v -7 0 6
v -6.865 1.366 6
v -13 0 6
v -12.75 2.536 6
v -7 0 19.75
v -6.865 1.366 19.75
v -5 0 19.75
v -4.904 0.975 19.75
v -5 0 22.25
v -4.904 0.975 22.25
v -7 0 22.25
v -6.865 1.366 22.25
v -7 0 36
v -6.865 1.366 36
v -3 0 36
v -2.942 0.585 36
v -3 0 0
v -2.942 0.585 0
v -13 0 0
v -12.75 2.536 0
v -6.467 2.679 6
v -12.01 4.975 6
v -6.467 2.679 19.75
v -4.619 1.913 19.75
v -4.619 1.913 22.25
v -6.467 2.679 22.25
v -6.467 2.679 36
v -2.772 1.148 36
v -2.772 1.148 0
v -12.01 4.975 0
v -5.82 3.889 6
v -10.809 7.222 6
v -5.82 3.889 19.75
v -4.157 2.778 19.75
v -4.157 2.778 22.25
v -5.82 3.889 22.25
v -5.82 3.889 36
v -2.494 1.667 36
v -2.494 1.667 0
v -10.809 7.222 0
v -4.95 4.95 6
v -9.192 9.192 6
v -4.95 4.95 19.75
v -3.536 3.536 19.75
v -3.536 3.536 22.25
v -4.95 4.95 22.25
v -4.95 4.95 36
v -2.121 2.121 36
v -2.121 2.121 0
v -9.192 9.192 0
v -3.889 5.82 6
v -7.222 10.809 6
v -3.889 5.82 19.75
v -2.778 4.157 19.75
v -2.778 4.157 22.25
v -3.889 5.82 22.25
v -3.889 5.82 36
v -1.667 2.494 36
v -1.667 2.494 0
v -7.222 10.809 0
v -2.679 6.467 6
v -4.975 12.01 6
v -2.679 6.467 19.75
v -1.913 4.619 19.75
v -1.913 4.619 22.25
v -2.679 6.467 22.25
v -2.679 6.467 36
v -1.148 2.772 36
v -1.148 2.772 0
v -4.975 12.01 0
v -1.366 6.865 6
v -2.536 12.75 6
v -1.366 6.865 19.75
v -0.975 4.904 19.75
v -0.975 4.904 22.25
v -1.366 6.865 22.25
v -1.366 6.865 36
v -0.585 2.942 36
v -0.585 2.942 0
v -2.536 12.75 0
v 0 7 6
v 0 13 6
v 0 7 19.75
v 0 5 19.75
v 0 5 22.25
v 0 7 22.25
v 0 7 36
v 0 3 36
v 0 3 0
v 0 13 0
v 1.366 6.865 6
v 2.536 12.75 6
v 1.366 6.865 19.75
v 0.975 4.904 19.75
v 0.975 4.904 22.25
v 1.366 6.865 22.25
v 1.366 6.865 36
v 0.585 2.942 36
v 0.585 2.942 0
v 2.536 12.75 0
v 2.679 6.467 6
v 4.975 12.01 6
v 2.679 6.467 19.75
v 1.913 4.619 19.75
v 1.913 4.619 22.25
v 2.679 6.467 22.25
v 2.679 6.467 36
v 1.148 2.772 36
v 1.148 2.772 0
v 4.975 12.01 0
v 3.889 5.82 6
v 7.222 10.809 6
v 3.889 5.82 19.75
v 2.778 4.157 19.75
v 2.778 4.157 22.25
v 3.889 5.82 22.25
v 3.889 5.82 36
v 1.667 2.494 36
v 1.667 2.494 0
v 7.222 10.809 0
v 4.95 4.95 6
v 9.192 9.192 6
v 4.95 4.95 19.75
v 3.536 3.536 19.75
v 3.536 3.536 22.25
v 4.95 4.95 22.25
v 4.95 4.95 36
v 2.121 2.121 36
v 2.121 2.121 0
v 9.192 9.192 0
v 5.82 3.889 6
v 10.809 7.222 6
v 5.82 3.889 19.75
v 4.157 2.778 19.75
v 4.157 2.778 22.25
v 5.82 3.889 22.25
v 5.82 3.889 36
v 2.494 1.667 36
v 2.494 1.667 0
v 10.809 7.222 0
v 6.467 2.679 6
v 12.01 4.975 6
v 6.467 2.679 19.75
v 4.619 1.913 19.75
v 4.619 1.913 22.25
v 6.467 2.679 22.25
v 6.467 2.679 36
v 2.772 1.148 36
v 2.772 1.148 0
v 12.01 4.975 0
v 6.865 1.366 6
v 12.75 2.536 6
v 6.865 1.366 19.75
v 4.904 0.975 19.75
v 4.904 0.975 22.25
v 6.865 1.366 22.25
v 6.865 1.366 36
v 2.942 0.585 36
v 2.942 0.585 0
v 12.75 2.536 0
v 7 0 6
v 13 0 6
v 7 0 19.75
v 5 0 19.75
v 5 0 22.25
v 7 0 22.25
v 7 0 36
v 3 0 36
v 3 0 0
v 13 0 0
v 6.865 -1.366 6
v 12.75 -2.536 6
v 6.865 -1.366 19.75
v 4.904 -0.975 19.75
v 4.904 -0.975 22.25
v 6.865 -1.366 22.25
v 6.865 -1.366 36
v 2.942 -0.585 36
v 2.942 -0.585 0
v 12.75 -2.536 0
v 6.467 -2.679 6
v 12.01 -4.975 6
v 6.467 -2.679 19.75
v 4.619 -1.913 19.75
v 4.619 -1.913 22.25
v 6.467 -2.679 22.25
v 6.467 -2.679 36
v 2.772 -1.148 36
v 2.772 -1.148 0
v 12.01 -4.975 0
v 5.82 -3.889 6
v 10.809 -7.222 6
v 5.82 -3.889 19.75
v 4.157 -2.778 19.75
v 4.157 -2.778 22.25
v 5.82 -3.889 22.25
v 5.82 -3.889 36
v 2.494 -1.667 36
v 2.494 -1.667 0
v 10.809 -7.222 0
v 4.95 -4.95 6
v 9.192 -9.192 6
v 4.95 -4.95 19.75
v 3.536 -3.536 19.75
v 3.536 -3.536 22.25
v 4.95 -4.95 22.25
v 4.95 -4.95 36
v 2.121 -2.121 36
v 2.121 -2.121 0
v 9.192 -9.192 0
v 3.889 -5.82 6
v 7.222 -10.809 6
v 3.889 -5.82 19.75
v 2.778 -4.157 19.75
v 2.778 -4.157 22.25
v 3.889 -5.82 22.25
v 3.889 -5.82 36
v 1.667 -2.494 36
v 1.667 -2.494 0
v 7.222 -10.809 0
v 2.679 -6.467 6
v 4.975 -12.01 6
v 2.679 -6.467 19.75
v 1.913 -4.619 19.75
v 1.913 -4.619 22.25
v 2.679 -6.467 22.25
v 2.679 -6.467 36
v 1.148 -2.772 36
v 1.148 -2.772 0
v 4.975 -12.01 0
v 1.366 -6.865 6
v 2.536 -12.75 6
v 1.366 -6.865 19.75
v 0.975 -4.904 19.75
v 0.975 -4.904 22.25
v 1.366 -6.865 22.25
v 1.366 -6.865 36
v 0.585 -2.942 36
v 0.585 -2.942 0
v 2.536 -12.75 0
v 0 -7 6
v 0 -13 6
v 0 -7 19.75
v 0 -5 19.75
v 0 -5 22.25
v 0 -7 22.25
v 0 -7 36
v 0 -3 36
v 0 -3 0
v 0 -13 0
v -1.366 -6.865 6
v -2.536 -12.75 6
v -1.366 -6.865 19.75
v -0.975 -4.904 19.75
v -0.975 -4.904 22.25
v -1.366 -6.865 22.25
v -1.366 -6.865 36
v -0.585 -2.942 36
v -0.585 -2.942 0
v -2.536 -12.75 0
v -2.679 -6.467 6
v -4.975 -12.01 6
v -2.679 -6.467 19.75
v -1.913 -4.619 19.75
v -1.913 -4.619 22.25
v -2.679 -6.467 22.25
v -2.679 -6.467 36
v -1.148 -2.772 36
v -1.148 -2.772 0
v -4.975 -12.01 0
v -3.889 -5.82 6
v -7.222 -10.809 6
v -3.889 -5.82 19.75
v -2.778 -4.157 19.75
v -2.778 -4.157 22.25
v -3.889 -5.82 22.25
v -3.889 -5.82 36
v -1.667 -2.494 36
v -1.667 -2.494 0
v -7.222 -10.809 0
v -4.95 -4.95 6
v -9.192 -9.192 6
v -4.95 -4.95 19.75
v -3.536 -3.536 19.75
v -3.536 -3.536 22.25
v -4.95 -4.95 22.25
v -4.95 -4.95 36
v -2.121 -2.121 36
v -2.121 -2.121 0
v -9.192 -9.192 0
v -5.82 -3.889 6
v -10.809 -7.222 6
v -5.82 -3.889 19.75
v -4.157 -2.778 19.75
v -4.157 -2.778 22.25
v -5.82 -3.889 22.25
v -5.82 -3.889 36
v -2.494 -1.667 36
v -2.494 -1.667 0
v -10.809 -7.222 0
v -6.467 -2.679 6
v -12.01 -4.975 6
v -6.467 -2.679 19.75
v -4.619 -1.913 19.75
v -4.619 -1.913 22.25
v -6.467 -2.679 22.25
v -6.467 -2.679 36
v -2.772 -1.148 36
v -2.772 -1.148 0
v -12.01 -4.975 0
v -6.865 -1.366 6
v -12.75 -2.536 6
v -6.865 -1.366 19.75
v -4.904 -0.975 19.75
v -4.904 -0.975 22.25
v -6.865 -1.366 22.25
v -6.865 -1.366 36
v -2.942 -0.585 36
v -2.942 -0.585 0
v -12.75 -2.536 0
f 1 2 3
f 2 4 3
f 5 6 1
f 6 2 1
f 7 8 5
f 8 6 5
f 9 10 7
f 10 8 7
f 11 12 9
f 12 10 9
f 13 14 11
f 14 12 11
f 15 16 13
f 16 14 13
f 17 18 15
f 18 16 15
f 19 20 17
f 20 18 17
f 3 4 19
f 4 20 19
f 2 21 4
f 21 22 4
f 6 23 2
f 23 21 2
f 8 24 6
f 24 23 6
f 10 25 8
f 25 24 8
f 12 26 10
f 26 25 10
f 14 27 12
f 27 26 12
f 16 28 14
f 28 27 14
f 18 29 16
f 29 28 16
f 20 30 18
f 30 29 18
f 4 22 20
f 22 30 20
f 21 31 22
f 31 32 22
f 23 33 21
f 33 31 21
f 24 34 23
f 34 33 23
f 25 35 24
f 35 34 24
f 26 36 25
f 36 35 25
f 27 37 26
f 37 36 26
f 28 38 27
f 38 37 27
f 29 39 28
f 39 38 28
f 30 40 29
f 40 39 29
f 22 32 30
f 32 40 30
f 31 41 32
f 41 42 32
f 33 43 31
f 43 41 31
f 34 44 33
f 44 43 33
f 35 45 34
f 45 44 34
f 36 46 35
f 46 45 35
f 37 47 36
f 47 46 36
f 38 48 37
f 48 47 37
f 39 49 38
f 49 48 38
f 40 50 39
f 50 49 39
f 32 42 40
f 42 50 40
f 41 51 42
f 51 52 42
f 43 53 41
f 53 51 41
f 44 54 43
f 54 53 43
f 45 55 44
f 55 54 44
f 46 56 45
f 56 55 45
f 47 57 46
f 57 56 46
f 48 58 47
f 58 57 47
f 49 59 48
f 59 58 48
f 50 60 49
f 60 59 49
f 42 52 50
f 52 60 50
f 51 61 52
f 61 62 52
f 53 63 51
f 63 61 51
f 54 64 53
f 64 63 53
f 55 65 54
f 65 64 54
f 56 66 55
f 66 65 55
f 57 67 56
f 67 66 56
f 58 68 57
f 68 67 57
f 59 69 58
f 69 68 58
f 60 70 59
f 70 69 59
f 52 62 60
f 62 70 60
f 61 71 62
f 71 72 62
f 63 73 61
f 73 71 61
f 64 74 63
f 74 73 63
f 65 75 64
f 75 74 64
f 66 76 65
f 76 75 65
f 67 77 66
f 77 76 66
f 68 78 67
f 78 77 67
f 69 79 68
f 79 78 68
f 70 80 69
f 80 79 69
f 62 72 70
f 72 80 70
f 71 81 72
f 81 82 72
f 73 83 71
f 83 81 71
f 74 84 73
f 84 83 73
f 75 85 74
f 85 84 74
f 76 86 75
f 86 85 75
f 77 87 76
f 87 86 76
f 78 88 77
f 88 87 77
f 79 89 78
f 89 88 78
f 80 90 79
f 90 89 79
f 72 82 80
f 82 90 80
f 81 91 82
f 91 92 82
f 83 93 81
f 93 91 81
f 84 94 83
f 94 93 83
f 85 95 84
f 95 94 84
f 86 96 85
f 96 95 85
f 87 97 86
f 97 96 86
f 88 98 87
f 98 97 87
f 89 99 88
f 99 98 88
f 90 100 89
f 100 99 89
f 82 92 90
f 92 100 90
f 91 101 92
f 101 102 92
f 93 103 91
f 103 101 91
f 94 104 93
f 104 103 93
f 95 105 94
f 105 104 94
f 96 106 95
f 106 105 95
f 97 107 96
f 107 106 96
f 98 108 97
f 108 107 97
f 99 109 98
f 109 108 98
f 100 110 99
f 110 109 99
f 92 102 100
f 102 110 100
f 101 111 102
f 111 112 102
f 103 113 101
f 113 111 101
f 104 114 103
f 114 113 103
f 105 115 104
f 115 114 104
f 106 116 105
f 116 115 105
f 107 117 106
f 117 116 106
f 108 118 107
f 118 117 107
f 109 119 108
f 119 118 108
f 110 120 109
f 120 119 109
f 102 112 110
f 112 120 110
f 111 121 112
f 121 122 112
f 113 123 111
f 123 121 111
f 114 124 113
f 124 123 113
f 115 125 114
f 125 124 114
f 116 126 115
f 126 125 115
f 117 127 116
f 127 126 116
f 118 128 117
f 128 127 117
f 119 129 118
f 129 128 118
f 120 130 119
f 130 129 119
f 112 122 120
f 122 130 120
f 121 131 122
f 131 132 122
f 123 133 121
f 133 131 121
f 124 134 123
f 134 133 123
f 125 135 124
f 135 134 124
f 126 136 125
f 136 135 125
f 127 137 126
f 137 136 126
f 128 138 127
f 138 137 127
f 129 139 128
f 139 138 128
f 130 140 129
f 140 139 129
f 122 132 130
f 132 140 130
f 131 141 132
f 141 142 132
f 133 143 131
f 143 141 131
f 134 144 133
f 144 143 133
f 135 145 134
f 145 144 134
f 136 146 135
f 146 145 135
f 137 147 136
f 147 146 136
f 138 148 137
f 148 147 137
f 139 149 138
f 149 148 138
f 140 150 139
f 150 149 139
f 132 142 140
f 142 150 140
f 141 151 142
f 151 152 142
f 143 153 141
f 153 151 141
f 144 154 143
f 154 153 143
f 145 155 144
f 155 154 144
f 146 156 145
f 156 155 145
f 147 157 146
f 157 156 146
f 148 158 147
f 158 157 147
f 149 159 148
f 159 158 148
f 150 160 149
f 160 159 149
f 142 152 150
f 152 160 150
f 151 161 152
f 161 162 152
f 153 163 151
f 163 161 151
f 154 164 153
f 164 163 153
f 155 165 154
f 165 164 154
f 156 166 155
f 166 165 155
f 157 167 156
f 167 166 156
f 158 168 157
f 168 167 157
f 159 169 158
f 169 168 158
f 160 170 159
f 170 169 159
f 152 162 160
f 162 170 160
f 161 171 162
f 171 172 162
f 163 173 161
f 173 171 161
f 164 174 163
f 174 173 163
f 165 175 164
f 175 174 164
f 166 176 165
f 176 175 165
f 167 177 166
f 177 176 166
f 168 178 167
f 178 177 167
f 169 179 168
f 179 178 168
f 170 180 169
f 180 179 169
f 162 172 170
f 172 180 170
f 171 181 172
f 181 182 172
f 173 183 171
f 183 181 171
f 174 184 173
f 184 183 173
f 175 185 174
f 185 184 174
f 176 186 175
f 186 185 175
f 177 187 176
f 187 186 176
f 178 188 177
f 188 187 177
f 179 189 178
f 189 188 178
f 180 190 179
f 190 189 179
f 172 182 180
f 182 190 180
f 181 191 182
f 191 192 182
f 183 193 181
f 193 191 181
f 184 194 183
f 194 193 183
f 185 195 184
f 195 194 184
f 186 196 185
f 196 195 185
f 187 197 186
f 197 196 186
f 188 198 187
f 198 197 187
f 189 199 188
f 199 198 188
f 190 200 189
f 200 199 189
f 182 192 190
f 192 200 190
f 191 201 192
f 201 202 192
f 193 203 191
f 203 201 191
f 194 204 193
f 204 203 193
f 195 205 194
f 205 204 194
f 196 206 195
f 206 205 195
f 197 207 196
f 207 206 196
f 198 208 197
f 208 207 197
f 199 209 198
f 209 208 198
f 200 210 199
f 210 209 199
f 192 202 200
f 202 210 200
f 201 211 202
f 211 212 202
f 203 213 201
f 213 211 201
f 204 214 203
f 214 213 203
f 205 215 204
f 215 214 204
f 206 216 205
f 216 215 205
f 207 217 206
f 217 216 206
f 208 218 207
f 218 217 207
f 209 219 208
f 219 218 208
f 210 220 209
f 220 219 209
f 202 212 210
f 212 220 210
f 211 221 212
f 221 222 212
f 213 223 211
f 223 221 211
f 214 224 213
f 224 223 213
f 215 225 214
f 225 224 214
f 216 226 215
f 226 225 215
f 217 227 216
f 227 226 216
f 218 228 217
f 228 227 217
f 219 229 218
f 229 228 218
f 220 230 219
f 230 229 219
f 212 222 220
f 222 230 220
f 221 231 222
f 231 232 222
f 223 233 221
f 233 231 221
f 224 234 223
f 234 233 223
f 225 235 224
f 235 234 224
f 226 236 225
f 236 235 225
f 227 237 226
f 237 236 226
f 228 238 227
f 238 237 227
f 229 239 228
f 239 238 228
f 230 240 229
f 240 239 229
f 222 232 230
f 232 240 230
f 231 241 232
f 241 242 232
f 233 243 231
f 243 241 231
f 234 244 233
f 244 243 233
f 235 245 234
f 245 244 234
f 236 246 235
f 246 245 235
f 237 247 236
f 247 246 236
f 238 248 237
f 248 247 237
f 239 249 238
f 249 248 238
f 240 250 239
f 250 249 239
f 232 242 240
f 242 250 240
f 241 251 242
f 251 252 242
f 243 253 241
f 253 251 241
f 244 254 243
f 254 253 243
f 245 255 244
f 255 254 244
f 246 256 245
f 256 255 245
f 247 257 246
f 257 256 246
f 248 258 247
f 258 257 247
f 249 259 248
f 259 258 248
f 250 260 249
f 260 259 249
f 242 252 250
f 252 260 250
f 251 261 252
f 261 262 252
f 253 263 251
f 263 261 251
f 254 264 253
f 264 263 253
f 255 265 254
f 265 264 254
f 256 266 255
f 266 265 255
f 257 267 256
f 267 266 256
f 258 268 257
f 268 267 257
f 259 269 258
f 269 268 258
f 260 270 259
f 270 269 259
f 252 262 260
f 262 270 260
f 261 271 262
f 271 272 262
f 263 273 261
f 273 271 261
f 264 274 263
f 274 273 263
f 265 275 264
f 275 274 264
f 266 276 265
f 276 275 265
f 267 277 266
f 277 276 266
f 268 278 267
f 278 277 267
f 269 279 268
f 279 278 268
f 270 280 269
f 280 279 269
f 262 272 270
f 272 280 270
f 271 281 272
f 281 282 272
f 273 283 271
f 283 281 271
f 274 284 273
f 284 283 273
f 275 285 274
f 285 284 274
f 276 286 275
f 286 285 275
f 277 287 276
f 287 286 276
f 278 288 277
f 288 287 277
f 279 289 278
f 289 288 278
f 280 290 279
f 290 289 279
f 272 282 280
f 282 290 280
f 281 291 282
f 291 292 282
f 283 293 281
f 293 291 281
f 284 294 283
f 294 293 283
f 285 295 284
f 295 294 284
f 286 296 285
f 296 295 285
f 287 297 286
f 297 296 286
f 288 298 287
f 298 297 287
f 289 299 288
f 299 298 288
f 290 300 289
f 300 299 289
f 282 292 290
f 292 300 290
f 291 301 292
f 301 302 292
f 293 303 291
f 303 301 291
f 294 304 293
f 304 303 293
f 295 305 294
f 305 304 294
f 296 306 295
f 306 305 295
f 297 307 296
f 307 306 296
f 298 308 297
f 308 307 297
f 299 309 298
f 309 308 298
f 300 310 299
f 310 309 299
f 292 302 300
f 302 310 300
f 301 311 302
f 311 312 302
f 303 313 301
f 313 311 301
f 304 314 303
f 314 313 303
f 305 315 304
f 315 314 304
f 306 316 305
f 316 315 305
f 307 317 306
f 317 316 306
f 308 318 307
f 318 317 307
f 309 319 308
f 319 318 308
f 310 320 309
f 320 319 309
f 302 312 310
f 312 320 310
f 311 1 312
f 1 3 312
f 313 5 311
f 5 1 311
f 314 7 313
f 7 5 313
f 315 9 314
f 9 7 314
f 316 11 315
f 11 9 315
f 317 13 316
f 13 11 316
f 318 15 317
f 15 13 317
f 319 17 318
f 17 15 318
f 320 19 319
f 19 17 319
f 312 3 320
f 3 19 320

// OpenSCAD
$fn = 32;

// ----------------------------------------------------------------------
// Grooved revolve: flanged, bore R3
// ----------------------------------------------------------------------

// --- parameters (mm) ---
bore_r = 3;               // bore radius
outer_r = 7;              // outer radius of the body
total_h = 36;             // overall height, Z
wall = 4;                 // radial wall thickness
groove_w = 2.5;           // groove width
groove_d = 2;             // groove depth
grooves = 1;              // number of outer grooves
flange_r = 13;            // flange radius
flange_h = 6;             // flange height
fit_tol = 0.02;           // declared fit tolerance (prompt contract)
free_tol = 0.2;           // declared free tolerance (prompt contract)

bbox_x = 2 * flange_r;  // full diameter
bore_d = 2 * bore_r;  // bore diameter
body_d = 2 * outer_r;  // body diameter
flange_d = 2 * flange_r;  // flange diameter
revolve_angle = 360;  // full turn around the Z axis

profile = [[3, 0], [7, 0], [13, 0], [13, 6], [7, 6], [7, 19.75], [5, 19.75], [5, 22.25], [7, 22.25], [7, 36], [3, 36]];  // primary outline, 11 points, counter clockwise

// --- the one profile operation ---
rotate_extrude(angle = revolve_angle) polygon(points = profile);
